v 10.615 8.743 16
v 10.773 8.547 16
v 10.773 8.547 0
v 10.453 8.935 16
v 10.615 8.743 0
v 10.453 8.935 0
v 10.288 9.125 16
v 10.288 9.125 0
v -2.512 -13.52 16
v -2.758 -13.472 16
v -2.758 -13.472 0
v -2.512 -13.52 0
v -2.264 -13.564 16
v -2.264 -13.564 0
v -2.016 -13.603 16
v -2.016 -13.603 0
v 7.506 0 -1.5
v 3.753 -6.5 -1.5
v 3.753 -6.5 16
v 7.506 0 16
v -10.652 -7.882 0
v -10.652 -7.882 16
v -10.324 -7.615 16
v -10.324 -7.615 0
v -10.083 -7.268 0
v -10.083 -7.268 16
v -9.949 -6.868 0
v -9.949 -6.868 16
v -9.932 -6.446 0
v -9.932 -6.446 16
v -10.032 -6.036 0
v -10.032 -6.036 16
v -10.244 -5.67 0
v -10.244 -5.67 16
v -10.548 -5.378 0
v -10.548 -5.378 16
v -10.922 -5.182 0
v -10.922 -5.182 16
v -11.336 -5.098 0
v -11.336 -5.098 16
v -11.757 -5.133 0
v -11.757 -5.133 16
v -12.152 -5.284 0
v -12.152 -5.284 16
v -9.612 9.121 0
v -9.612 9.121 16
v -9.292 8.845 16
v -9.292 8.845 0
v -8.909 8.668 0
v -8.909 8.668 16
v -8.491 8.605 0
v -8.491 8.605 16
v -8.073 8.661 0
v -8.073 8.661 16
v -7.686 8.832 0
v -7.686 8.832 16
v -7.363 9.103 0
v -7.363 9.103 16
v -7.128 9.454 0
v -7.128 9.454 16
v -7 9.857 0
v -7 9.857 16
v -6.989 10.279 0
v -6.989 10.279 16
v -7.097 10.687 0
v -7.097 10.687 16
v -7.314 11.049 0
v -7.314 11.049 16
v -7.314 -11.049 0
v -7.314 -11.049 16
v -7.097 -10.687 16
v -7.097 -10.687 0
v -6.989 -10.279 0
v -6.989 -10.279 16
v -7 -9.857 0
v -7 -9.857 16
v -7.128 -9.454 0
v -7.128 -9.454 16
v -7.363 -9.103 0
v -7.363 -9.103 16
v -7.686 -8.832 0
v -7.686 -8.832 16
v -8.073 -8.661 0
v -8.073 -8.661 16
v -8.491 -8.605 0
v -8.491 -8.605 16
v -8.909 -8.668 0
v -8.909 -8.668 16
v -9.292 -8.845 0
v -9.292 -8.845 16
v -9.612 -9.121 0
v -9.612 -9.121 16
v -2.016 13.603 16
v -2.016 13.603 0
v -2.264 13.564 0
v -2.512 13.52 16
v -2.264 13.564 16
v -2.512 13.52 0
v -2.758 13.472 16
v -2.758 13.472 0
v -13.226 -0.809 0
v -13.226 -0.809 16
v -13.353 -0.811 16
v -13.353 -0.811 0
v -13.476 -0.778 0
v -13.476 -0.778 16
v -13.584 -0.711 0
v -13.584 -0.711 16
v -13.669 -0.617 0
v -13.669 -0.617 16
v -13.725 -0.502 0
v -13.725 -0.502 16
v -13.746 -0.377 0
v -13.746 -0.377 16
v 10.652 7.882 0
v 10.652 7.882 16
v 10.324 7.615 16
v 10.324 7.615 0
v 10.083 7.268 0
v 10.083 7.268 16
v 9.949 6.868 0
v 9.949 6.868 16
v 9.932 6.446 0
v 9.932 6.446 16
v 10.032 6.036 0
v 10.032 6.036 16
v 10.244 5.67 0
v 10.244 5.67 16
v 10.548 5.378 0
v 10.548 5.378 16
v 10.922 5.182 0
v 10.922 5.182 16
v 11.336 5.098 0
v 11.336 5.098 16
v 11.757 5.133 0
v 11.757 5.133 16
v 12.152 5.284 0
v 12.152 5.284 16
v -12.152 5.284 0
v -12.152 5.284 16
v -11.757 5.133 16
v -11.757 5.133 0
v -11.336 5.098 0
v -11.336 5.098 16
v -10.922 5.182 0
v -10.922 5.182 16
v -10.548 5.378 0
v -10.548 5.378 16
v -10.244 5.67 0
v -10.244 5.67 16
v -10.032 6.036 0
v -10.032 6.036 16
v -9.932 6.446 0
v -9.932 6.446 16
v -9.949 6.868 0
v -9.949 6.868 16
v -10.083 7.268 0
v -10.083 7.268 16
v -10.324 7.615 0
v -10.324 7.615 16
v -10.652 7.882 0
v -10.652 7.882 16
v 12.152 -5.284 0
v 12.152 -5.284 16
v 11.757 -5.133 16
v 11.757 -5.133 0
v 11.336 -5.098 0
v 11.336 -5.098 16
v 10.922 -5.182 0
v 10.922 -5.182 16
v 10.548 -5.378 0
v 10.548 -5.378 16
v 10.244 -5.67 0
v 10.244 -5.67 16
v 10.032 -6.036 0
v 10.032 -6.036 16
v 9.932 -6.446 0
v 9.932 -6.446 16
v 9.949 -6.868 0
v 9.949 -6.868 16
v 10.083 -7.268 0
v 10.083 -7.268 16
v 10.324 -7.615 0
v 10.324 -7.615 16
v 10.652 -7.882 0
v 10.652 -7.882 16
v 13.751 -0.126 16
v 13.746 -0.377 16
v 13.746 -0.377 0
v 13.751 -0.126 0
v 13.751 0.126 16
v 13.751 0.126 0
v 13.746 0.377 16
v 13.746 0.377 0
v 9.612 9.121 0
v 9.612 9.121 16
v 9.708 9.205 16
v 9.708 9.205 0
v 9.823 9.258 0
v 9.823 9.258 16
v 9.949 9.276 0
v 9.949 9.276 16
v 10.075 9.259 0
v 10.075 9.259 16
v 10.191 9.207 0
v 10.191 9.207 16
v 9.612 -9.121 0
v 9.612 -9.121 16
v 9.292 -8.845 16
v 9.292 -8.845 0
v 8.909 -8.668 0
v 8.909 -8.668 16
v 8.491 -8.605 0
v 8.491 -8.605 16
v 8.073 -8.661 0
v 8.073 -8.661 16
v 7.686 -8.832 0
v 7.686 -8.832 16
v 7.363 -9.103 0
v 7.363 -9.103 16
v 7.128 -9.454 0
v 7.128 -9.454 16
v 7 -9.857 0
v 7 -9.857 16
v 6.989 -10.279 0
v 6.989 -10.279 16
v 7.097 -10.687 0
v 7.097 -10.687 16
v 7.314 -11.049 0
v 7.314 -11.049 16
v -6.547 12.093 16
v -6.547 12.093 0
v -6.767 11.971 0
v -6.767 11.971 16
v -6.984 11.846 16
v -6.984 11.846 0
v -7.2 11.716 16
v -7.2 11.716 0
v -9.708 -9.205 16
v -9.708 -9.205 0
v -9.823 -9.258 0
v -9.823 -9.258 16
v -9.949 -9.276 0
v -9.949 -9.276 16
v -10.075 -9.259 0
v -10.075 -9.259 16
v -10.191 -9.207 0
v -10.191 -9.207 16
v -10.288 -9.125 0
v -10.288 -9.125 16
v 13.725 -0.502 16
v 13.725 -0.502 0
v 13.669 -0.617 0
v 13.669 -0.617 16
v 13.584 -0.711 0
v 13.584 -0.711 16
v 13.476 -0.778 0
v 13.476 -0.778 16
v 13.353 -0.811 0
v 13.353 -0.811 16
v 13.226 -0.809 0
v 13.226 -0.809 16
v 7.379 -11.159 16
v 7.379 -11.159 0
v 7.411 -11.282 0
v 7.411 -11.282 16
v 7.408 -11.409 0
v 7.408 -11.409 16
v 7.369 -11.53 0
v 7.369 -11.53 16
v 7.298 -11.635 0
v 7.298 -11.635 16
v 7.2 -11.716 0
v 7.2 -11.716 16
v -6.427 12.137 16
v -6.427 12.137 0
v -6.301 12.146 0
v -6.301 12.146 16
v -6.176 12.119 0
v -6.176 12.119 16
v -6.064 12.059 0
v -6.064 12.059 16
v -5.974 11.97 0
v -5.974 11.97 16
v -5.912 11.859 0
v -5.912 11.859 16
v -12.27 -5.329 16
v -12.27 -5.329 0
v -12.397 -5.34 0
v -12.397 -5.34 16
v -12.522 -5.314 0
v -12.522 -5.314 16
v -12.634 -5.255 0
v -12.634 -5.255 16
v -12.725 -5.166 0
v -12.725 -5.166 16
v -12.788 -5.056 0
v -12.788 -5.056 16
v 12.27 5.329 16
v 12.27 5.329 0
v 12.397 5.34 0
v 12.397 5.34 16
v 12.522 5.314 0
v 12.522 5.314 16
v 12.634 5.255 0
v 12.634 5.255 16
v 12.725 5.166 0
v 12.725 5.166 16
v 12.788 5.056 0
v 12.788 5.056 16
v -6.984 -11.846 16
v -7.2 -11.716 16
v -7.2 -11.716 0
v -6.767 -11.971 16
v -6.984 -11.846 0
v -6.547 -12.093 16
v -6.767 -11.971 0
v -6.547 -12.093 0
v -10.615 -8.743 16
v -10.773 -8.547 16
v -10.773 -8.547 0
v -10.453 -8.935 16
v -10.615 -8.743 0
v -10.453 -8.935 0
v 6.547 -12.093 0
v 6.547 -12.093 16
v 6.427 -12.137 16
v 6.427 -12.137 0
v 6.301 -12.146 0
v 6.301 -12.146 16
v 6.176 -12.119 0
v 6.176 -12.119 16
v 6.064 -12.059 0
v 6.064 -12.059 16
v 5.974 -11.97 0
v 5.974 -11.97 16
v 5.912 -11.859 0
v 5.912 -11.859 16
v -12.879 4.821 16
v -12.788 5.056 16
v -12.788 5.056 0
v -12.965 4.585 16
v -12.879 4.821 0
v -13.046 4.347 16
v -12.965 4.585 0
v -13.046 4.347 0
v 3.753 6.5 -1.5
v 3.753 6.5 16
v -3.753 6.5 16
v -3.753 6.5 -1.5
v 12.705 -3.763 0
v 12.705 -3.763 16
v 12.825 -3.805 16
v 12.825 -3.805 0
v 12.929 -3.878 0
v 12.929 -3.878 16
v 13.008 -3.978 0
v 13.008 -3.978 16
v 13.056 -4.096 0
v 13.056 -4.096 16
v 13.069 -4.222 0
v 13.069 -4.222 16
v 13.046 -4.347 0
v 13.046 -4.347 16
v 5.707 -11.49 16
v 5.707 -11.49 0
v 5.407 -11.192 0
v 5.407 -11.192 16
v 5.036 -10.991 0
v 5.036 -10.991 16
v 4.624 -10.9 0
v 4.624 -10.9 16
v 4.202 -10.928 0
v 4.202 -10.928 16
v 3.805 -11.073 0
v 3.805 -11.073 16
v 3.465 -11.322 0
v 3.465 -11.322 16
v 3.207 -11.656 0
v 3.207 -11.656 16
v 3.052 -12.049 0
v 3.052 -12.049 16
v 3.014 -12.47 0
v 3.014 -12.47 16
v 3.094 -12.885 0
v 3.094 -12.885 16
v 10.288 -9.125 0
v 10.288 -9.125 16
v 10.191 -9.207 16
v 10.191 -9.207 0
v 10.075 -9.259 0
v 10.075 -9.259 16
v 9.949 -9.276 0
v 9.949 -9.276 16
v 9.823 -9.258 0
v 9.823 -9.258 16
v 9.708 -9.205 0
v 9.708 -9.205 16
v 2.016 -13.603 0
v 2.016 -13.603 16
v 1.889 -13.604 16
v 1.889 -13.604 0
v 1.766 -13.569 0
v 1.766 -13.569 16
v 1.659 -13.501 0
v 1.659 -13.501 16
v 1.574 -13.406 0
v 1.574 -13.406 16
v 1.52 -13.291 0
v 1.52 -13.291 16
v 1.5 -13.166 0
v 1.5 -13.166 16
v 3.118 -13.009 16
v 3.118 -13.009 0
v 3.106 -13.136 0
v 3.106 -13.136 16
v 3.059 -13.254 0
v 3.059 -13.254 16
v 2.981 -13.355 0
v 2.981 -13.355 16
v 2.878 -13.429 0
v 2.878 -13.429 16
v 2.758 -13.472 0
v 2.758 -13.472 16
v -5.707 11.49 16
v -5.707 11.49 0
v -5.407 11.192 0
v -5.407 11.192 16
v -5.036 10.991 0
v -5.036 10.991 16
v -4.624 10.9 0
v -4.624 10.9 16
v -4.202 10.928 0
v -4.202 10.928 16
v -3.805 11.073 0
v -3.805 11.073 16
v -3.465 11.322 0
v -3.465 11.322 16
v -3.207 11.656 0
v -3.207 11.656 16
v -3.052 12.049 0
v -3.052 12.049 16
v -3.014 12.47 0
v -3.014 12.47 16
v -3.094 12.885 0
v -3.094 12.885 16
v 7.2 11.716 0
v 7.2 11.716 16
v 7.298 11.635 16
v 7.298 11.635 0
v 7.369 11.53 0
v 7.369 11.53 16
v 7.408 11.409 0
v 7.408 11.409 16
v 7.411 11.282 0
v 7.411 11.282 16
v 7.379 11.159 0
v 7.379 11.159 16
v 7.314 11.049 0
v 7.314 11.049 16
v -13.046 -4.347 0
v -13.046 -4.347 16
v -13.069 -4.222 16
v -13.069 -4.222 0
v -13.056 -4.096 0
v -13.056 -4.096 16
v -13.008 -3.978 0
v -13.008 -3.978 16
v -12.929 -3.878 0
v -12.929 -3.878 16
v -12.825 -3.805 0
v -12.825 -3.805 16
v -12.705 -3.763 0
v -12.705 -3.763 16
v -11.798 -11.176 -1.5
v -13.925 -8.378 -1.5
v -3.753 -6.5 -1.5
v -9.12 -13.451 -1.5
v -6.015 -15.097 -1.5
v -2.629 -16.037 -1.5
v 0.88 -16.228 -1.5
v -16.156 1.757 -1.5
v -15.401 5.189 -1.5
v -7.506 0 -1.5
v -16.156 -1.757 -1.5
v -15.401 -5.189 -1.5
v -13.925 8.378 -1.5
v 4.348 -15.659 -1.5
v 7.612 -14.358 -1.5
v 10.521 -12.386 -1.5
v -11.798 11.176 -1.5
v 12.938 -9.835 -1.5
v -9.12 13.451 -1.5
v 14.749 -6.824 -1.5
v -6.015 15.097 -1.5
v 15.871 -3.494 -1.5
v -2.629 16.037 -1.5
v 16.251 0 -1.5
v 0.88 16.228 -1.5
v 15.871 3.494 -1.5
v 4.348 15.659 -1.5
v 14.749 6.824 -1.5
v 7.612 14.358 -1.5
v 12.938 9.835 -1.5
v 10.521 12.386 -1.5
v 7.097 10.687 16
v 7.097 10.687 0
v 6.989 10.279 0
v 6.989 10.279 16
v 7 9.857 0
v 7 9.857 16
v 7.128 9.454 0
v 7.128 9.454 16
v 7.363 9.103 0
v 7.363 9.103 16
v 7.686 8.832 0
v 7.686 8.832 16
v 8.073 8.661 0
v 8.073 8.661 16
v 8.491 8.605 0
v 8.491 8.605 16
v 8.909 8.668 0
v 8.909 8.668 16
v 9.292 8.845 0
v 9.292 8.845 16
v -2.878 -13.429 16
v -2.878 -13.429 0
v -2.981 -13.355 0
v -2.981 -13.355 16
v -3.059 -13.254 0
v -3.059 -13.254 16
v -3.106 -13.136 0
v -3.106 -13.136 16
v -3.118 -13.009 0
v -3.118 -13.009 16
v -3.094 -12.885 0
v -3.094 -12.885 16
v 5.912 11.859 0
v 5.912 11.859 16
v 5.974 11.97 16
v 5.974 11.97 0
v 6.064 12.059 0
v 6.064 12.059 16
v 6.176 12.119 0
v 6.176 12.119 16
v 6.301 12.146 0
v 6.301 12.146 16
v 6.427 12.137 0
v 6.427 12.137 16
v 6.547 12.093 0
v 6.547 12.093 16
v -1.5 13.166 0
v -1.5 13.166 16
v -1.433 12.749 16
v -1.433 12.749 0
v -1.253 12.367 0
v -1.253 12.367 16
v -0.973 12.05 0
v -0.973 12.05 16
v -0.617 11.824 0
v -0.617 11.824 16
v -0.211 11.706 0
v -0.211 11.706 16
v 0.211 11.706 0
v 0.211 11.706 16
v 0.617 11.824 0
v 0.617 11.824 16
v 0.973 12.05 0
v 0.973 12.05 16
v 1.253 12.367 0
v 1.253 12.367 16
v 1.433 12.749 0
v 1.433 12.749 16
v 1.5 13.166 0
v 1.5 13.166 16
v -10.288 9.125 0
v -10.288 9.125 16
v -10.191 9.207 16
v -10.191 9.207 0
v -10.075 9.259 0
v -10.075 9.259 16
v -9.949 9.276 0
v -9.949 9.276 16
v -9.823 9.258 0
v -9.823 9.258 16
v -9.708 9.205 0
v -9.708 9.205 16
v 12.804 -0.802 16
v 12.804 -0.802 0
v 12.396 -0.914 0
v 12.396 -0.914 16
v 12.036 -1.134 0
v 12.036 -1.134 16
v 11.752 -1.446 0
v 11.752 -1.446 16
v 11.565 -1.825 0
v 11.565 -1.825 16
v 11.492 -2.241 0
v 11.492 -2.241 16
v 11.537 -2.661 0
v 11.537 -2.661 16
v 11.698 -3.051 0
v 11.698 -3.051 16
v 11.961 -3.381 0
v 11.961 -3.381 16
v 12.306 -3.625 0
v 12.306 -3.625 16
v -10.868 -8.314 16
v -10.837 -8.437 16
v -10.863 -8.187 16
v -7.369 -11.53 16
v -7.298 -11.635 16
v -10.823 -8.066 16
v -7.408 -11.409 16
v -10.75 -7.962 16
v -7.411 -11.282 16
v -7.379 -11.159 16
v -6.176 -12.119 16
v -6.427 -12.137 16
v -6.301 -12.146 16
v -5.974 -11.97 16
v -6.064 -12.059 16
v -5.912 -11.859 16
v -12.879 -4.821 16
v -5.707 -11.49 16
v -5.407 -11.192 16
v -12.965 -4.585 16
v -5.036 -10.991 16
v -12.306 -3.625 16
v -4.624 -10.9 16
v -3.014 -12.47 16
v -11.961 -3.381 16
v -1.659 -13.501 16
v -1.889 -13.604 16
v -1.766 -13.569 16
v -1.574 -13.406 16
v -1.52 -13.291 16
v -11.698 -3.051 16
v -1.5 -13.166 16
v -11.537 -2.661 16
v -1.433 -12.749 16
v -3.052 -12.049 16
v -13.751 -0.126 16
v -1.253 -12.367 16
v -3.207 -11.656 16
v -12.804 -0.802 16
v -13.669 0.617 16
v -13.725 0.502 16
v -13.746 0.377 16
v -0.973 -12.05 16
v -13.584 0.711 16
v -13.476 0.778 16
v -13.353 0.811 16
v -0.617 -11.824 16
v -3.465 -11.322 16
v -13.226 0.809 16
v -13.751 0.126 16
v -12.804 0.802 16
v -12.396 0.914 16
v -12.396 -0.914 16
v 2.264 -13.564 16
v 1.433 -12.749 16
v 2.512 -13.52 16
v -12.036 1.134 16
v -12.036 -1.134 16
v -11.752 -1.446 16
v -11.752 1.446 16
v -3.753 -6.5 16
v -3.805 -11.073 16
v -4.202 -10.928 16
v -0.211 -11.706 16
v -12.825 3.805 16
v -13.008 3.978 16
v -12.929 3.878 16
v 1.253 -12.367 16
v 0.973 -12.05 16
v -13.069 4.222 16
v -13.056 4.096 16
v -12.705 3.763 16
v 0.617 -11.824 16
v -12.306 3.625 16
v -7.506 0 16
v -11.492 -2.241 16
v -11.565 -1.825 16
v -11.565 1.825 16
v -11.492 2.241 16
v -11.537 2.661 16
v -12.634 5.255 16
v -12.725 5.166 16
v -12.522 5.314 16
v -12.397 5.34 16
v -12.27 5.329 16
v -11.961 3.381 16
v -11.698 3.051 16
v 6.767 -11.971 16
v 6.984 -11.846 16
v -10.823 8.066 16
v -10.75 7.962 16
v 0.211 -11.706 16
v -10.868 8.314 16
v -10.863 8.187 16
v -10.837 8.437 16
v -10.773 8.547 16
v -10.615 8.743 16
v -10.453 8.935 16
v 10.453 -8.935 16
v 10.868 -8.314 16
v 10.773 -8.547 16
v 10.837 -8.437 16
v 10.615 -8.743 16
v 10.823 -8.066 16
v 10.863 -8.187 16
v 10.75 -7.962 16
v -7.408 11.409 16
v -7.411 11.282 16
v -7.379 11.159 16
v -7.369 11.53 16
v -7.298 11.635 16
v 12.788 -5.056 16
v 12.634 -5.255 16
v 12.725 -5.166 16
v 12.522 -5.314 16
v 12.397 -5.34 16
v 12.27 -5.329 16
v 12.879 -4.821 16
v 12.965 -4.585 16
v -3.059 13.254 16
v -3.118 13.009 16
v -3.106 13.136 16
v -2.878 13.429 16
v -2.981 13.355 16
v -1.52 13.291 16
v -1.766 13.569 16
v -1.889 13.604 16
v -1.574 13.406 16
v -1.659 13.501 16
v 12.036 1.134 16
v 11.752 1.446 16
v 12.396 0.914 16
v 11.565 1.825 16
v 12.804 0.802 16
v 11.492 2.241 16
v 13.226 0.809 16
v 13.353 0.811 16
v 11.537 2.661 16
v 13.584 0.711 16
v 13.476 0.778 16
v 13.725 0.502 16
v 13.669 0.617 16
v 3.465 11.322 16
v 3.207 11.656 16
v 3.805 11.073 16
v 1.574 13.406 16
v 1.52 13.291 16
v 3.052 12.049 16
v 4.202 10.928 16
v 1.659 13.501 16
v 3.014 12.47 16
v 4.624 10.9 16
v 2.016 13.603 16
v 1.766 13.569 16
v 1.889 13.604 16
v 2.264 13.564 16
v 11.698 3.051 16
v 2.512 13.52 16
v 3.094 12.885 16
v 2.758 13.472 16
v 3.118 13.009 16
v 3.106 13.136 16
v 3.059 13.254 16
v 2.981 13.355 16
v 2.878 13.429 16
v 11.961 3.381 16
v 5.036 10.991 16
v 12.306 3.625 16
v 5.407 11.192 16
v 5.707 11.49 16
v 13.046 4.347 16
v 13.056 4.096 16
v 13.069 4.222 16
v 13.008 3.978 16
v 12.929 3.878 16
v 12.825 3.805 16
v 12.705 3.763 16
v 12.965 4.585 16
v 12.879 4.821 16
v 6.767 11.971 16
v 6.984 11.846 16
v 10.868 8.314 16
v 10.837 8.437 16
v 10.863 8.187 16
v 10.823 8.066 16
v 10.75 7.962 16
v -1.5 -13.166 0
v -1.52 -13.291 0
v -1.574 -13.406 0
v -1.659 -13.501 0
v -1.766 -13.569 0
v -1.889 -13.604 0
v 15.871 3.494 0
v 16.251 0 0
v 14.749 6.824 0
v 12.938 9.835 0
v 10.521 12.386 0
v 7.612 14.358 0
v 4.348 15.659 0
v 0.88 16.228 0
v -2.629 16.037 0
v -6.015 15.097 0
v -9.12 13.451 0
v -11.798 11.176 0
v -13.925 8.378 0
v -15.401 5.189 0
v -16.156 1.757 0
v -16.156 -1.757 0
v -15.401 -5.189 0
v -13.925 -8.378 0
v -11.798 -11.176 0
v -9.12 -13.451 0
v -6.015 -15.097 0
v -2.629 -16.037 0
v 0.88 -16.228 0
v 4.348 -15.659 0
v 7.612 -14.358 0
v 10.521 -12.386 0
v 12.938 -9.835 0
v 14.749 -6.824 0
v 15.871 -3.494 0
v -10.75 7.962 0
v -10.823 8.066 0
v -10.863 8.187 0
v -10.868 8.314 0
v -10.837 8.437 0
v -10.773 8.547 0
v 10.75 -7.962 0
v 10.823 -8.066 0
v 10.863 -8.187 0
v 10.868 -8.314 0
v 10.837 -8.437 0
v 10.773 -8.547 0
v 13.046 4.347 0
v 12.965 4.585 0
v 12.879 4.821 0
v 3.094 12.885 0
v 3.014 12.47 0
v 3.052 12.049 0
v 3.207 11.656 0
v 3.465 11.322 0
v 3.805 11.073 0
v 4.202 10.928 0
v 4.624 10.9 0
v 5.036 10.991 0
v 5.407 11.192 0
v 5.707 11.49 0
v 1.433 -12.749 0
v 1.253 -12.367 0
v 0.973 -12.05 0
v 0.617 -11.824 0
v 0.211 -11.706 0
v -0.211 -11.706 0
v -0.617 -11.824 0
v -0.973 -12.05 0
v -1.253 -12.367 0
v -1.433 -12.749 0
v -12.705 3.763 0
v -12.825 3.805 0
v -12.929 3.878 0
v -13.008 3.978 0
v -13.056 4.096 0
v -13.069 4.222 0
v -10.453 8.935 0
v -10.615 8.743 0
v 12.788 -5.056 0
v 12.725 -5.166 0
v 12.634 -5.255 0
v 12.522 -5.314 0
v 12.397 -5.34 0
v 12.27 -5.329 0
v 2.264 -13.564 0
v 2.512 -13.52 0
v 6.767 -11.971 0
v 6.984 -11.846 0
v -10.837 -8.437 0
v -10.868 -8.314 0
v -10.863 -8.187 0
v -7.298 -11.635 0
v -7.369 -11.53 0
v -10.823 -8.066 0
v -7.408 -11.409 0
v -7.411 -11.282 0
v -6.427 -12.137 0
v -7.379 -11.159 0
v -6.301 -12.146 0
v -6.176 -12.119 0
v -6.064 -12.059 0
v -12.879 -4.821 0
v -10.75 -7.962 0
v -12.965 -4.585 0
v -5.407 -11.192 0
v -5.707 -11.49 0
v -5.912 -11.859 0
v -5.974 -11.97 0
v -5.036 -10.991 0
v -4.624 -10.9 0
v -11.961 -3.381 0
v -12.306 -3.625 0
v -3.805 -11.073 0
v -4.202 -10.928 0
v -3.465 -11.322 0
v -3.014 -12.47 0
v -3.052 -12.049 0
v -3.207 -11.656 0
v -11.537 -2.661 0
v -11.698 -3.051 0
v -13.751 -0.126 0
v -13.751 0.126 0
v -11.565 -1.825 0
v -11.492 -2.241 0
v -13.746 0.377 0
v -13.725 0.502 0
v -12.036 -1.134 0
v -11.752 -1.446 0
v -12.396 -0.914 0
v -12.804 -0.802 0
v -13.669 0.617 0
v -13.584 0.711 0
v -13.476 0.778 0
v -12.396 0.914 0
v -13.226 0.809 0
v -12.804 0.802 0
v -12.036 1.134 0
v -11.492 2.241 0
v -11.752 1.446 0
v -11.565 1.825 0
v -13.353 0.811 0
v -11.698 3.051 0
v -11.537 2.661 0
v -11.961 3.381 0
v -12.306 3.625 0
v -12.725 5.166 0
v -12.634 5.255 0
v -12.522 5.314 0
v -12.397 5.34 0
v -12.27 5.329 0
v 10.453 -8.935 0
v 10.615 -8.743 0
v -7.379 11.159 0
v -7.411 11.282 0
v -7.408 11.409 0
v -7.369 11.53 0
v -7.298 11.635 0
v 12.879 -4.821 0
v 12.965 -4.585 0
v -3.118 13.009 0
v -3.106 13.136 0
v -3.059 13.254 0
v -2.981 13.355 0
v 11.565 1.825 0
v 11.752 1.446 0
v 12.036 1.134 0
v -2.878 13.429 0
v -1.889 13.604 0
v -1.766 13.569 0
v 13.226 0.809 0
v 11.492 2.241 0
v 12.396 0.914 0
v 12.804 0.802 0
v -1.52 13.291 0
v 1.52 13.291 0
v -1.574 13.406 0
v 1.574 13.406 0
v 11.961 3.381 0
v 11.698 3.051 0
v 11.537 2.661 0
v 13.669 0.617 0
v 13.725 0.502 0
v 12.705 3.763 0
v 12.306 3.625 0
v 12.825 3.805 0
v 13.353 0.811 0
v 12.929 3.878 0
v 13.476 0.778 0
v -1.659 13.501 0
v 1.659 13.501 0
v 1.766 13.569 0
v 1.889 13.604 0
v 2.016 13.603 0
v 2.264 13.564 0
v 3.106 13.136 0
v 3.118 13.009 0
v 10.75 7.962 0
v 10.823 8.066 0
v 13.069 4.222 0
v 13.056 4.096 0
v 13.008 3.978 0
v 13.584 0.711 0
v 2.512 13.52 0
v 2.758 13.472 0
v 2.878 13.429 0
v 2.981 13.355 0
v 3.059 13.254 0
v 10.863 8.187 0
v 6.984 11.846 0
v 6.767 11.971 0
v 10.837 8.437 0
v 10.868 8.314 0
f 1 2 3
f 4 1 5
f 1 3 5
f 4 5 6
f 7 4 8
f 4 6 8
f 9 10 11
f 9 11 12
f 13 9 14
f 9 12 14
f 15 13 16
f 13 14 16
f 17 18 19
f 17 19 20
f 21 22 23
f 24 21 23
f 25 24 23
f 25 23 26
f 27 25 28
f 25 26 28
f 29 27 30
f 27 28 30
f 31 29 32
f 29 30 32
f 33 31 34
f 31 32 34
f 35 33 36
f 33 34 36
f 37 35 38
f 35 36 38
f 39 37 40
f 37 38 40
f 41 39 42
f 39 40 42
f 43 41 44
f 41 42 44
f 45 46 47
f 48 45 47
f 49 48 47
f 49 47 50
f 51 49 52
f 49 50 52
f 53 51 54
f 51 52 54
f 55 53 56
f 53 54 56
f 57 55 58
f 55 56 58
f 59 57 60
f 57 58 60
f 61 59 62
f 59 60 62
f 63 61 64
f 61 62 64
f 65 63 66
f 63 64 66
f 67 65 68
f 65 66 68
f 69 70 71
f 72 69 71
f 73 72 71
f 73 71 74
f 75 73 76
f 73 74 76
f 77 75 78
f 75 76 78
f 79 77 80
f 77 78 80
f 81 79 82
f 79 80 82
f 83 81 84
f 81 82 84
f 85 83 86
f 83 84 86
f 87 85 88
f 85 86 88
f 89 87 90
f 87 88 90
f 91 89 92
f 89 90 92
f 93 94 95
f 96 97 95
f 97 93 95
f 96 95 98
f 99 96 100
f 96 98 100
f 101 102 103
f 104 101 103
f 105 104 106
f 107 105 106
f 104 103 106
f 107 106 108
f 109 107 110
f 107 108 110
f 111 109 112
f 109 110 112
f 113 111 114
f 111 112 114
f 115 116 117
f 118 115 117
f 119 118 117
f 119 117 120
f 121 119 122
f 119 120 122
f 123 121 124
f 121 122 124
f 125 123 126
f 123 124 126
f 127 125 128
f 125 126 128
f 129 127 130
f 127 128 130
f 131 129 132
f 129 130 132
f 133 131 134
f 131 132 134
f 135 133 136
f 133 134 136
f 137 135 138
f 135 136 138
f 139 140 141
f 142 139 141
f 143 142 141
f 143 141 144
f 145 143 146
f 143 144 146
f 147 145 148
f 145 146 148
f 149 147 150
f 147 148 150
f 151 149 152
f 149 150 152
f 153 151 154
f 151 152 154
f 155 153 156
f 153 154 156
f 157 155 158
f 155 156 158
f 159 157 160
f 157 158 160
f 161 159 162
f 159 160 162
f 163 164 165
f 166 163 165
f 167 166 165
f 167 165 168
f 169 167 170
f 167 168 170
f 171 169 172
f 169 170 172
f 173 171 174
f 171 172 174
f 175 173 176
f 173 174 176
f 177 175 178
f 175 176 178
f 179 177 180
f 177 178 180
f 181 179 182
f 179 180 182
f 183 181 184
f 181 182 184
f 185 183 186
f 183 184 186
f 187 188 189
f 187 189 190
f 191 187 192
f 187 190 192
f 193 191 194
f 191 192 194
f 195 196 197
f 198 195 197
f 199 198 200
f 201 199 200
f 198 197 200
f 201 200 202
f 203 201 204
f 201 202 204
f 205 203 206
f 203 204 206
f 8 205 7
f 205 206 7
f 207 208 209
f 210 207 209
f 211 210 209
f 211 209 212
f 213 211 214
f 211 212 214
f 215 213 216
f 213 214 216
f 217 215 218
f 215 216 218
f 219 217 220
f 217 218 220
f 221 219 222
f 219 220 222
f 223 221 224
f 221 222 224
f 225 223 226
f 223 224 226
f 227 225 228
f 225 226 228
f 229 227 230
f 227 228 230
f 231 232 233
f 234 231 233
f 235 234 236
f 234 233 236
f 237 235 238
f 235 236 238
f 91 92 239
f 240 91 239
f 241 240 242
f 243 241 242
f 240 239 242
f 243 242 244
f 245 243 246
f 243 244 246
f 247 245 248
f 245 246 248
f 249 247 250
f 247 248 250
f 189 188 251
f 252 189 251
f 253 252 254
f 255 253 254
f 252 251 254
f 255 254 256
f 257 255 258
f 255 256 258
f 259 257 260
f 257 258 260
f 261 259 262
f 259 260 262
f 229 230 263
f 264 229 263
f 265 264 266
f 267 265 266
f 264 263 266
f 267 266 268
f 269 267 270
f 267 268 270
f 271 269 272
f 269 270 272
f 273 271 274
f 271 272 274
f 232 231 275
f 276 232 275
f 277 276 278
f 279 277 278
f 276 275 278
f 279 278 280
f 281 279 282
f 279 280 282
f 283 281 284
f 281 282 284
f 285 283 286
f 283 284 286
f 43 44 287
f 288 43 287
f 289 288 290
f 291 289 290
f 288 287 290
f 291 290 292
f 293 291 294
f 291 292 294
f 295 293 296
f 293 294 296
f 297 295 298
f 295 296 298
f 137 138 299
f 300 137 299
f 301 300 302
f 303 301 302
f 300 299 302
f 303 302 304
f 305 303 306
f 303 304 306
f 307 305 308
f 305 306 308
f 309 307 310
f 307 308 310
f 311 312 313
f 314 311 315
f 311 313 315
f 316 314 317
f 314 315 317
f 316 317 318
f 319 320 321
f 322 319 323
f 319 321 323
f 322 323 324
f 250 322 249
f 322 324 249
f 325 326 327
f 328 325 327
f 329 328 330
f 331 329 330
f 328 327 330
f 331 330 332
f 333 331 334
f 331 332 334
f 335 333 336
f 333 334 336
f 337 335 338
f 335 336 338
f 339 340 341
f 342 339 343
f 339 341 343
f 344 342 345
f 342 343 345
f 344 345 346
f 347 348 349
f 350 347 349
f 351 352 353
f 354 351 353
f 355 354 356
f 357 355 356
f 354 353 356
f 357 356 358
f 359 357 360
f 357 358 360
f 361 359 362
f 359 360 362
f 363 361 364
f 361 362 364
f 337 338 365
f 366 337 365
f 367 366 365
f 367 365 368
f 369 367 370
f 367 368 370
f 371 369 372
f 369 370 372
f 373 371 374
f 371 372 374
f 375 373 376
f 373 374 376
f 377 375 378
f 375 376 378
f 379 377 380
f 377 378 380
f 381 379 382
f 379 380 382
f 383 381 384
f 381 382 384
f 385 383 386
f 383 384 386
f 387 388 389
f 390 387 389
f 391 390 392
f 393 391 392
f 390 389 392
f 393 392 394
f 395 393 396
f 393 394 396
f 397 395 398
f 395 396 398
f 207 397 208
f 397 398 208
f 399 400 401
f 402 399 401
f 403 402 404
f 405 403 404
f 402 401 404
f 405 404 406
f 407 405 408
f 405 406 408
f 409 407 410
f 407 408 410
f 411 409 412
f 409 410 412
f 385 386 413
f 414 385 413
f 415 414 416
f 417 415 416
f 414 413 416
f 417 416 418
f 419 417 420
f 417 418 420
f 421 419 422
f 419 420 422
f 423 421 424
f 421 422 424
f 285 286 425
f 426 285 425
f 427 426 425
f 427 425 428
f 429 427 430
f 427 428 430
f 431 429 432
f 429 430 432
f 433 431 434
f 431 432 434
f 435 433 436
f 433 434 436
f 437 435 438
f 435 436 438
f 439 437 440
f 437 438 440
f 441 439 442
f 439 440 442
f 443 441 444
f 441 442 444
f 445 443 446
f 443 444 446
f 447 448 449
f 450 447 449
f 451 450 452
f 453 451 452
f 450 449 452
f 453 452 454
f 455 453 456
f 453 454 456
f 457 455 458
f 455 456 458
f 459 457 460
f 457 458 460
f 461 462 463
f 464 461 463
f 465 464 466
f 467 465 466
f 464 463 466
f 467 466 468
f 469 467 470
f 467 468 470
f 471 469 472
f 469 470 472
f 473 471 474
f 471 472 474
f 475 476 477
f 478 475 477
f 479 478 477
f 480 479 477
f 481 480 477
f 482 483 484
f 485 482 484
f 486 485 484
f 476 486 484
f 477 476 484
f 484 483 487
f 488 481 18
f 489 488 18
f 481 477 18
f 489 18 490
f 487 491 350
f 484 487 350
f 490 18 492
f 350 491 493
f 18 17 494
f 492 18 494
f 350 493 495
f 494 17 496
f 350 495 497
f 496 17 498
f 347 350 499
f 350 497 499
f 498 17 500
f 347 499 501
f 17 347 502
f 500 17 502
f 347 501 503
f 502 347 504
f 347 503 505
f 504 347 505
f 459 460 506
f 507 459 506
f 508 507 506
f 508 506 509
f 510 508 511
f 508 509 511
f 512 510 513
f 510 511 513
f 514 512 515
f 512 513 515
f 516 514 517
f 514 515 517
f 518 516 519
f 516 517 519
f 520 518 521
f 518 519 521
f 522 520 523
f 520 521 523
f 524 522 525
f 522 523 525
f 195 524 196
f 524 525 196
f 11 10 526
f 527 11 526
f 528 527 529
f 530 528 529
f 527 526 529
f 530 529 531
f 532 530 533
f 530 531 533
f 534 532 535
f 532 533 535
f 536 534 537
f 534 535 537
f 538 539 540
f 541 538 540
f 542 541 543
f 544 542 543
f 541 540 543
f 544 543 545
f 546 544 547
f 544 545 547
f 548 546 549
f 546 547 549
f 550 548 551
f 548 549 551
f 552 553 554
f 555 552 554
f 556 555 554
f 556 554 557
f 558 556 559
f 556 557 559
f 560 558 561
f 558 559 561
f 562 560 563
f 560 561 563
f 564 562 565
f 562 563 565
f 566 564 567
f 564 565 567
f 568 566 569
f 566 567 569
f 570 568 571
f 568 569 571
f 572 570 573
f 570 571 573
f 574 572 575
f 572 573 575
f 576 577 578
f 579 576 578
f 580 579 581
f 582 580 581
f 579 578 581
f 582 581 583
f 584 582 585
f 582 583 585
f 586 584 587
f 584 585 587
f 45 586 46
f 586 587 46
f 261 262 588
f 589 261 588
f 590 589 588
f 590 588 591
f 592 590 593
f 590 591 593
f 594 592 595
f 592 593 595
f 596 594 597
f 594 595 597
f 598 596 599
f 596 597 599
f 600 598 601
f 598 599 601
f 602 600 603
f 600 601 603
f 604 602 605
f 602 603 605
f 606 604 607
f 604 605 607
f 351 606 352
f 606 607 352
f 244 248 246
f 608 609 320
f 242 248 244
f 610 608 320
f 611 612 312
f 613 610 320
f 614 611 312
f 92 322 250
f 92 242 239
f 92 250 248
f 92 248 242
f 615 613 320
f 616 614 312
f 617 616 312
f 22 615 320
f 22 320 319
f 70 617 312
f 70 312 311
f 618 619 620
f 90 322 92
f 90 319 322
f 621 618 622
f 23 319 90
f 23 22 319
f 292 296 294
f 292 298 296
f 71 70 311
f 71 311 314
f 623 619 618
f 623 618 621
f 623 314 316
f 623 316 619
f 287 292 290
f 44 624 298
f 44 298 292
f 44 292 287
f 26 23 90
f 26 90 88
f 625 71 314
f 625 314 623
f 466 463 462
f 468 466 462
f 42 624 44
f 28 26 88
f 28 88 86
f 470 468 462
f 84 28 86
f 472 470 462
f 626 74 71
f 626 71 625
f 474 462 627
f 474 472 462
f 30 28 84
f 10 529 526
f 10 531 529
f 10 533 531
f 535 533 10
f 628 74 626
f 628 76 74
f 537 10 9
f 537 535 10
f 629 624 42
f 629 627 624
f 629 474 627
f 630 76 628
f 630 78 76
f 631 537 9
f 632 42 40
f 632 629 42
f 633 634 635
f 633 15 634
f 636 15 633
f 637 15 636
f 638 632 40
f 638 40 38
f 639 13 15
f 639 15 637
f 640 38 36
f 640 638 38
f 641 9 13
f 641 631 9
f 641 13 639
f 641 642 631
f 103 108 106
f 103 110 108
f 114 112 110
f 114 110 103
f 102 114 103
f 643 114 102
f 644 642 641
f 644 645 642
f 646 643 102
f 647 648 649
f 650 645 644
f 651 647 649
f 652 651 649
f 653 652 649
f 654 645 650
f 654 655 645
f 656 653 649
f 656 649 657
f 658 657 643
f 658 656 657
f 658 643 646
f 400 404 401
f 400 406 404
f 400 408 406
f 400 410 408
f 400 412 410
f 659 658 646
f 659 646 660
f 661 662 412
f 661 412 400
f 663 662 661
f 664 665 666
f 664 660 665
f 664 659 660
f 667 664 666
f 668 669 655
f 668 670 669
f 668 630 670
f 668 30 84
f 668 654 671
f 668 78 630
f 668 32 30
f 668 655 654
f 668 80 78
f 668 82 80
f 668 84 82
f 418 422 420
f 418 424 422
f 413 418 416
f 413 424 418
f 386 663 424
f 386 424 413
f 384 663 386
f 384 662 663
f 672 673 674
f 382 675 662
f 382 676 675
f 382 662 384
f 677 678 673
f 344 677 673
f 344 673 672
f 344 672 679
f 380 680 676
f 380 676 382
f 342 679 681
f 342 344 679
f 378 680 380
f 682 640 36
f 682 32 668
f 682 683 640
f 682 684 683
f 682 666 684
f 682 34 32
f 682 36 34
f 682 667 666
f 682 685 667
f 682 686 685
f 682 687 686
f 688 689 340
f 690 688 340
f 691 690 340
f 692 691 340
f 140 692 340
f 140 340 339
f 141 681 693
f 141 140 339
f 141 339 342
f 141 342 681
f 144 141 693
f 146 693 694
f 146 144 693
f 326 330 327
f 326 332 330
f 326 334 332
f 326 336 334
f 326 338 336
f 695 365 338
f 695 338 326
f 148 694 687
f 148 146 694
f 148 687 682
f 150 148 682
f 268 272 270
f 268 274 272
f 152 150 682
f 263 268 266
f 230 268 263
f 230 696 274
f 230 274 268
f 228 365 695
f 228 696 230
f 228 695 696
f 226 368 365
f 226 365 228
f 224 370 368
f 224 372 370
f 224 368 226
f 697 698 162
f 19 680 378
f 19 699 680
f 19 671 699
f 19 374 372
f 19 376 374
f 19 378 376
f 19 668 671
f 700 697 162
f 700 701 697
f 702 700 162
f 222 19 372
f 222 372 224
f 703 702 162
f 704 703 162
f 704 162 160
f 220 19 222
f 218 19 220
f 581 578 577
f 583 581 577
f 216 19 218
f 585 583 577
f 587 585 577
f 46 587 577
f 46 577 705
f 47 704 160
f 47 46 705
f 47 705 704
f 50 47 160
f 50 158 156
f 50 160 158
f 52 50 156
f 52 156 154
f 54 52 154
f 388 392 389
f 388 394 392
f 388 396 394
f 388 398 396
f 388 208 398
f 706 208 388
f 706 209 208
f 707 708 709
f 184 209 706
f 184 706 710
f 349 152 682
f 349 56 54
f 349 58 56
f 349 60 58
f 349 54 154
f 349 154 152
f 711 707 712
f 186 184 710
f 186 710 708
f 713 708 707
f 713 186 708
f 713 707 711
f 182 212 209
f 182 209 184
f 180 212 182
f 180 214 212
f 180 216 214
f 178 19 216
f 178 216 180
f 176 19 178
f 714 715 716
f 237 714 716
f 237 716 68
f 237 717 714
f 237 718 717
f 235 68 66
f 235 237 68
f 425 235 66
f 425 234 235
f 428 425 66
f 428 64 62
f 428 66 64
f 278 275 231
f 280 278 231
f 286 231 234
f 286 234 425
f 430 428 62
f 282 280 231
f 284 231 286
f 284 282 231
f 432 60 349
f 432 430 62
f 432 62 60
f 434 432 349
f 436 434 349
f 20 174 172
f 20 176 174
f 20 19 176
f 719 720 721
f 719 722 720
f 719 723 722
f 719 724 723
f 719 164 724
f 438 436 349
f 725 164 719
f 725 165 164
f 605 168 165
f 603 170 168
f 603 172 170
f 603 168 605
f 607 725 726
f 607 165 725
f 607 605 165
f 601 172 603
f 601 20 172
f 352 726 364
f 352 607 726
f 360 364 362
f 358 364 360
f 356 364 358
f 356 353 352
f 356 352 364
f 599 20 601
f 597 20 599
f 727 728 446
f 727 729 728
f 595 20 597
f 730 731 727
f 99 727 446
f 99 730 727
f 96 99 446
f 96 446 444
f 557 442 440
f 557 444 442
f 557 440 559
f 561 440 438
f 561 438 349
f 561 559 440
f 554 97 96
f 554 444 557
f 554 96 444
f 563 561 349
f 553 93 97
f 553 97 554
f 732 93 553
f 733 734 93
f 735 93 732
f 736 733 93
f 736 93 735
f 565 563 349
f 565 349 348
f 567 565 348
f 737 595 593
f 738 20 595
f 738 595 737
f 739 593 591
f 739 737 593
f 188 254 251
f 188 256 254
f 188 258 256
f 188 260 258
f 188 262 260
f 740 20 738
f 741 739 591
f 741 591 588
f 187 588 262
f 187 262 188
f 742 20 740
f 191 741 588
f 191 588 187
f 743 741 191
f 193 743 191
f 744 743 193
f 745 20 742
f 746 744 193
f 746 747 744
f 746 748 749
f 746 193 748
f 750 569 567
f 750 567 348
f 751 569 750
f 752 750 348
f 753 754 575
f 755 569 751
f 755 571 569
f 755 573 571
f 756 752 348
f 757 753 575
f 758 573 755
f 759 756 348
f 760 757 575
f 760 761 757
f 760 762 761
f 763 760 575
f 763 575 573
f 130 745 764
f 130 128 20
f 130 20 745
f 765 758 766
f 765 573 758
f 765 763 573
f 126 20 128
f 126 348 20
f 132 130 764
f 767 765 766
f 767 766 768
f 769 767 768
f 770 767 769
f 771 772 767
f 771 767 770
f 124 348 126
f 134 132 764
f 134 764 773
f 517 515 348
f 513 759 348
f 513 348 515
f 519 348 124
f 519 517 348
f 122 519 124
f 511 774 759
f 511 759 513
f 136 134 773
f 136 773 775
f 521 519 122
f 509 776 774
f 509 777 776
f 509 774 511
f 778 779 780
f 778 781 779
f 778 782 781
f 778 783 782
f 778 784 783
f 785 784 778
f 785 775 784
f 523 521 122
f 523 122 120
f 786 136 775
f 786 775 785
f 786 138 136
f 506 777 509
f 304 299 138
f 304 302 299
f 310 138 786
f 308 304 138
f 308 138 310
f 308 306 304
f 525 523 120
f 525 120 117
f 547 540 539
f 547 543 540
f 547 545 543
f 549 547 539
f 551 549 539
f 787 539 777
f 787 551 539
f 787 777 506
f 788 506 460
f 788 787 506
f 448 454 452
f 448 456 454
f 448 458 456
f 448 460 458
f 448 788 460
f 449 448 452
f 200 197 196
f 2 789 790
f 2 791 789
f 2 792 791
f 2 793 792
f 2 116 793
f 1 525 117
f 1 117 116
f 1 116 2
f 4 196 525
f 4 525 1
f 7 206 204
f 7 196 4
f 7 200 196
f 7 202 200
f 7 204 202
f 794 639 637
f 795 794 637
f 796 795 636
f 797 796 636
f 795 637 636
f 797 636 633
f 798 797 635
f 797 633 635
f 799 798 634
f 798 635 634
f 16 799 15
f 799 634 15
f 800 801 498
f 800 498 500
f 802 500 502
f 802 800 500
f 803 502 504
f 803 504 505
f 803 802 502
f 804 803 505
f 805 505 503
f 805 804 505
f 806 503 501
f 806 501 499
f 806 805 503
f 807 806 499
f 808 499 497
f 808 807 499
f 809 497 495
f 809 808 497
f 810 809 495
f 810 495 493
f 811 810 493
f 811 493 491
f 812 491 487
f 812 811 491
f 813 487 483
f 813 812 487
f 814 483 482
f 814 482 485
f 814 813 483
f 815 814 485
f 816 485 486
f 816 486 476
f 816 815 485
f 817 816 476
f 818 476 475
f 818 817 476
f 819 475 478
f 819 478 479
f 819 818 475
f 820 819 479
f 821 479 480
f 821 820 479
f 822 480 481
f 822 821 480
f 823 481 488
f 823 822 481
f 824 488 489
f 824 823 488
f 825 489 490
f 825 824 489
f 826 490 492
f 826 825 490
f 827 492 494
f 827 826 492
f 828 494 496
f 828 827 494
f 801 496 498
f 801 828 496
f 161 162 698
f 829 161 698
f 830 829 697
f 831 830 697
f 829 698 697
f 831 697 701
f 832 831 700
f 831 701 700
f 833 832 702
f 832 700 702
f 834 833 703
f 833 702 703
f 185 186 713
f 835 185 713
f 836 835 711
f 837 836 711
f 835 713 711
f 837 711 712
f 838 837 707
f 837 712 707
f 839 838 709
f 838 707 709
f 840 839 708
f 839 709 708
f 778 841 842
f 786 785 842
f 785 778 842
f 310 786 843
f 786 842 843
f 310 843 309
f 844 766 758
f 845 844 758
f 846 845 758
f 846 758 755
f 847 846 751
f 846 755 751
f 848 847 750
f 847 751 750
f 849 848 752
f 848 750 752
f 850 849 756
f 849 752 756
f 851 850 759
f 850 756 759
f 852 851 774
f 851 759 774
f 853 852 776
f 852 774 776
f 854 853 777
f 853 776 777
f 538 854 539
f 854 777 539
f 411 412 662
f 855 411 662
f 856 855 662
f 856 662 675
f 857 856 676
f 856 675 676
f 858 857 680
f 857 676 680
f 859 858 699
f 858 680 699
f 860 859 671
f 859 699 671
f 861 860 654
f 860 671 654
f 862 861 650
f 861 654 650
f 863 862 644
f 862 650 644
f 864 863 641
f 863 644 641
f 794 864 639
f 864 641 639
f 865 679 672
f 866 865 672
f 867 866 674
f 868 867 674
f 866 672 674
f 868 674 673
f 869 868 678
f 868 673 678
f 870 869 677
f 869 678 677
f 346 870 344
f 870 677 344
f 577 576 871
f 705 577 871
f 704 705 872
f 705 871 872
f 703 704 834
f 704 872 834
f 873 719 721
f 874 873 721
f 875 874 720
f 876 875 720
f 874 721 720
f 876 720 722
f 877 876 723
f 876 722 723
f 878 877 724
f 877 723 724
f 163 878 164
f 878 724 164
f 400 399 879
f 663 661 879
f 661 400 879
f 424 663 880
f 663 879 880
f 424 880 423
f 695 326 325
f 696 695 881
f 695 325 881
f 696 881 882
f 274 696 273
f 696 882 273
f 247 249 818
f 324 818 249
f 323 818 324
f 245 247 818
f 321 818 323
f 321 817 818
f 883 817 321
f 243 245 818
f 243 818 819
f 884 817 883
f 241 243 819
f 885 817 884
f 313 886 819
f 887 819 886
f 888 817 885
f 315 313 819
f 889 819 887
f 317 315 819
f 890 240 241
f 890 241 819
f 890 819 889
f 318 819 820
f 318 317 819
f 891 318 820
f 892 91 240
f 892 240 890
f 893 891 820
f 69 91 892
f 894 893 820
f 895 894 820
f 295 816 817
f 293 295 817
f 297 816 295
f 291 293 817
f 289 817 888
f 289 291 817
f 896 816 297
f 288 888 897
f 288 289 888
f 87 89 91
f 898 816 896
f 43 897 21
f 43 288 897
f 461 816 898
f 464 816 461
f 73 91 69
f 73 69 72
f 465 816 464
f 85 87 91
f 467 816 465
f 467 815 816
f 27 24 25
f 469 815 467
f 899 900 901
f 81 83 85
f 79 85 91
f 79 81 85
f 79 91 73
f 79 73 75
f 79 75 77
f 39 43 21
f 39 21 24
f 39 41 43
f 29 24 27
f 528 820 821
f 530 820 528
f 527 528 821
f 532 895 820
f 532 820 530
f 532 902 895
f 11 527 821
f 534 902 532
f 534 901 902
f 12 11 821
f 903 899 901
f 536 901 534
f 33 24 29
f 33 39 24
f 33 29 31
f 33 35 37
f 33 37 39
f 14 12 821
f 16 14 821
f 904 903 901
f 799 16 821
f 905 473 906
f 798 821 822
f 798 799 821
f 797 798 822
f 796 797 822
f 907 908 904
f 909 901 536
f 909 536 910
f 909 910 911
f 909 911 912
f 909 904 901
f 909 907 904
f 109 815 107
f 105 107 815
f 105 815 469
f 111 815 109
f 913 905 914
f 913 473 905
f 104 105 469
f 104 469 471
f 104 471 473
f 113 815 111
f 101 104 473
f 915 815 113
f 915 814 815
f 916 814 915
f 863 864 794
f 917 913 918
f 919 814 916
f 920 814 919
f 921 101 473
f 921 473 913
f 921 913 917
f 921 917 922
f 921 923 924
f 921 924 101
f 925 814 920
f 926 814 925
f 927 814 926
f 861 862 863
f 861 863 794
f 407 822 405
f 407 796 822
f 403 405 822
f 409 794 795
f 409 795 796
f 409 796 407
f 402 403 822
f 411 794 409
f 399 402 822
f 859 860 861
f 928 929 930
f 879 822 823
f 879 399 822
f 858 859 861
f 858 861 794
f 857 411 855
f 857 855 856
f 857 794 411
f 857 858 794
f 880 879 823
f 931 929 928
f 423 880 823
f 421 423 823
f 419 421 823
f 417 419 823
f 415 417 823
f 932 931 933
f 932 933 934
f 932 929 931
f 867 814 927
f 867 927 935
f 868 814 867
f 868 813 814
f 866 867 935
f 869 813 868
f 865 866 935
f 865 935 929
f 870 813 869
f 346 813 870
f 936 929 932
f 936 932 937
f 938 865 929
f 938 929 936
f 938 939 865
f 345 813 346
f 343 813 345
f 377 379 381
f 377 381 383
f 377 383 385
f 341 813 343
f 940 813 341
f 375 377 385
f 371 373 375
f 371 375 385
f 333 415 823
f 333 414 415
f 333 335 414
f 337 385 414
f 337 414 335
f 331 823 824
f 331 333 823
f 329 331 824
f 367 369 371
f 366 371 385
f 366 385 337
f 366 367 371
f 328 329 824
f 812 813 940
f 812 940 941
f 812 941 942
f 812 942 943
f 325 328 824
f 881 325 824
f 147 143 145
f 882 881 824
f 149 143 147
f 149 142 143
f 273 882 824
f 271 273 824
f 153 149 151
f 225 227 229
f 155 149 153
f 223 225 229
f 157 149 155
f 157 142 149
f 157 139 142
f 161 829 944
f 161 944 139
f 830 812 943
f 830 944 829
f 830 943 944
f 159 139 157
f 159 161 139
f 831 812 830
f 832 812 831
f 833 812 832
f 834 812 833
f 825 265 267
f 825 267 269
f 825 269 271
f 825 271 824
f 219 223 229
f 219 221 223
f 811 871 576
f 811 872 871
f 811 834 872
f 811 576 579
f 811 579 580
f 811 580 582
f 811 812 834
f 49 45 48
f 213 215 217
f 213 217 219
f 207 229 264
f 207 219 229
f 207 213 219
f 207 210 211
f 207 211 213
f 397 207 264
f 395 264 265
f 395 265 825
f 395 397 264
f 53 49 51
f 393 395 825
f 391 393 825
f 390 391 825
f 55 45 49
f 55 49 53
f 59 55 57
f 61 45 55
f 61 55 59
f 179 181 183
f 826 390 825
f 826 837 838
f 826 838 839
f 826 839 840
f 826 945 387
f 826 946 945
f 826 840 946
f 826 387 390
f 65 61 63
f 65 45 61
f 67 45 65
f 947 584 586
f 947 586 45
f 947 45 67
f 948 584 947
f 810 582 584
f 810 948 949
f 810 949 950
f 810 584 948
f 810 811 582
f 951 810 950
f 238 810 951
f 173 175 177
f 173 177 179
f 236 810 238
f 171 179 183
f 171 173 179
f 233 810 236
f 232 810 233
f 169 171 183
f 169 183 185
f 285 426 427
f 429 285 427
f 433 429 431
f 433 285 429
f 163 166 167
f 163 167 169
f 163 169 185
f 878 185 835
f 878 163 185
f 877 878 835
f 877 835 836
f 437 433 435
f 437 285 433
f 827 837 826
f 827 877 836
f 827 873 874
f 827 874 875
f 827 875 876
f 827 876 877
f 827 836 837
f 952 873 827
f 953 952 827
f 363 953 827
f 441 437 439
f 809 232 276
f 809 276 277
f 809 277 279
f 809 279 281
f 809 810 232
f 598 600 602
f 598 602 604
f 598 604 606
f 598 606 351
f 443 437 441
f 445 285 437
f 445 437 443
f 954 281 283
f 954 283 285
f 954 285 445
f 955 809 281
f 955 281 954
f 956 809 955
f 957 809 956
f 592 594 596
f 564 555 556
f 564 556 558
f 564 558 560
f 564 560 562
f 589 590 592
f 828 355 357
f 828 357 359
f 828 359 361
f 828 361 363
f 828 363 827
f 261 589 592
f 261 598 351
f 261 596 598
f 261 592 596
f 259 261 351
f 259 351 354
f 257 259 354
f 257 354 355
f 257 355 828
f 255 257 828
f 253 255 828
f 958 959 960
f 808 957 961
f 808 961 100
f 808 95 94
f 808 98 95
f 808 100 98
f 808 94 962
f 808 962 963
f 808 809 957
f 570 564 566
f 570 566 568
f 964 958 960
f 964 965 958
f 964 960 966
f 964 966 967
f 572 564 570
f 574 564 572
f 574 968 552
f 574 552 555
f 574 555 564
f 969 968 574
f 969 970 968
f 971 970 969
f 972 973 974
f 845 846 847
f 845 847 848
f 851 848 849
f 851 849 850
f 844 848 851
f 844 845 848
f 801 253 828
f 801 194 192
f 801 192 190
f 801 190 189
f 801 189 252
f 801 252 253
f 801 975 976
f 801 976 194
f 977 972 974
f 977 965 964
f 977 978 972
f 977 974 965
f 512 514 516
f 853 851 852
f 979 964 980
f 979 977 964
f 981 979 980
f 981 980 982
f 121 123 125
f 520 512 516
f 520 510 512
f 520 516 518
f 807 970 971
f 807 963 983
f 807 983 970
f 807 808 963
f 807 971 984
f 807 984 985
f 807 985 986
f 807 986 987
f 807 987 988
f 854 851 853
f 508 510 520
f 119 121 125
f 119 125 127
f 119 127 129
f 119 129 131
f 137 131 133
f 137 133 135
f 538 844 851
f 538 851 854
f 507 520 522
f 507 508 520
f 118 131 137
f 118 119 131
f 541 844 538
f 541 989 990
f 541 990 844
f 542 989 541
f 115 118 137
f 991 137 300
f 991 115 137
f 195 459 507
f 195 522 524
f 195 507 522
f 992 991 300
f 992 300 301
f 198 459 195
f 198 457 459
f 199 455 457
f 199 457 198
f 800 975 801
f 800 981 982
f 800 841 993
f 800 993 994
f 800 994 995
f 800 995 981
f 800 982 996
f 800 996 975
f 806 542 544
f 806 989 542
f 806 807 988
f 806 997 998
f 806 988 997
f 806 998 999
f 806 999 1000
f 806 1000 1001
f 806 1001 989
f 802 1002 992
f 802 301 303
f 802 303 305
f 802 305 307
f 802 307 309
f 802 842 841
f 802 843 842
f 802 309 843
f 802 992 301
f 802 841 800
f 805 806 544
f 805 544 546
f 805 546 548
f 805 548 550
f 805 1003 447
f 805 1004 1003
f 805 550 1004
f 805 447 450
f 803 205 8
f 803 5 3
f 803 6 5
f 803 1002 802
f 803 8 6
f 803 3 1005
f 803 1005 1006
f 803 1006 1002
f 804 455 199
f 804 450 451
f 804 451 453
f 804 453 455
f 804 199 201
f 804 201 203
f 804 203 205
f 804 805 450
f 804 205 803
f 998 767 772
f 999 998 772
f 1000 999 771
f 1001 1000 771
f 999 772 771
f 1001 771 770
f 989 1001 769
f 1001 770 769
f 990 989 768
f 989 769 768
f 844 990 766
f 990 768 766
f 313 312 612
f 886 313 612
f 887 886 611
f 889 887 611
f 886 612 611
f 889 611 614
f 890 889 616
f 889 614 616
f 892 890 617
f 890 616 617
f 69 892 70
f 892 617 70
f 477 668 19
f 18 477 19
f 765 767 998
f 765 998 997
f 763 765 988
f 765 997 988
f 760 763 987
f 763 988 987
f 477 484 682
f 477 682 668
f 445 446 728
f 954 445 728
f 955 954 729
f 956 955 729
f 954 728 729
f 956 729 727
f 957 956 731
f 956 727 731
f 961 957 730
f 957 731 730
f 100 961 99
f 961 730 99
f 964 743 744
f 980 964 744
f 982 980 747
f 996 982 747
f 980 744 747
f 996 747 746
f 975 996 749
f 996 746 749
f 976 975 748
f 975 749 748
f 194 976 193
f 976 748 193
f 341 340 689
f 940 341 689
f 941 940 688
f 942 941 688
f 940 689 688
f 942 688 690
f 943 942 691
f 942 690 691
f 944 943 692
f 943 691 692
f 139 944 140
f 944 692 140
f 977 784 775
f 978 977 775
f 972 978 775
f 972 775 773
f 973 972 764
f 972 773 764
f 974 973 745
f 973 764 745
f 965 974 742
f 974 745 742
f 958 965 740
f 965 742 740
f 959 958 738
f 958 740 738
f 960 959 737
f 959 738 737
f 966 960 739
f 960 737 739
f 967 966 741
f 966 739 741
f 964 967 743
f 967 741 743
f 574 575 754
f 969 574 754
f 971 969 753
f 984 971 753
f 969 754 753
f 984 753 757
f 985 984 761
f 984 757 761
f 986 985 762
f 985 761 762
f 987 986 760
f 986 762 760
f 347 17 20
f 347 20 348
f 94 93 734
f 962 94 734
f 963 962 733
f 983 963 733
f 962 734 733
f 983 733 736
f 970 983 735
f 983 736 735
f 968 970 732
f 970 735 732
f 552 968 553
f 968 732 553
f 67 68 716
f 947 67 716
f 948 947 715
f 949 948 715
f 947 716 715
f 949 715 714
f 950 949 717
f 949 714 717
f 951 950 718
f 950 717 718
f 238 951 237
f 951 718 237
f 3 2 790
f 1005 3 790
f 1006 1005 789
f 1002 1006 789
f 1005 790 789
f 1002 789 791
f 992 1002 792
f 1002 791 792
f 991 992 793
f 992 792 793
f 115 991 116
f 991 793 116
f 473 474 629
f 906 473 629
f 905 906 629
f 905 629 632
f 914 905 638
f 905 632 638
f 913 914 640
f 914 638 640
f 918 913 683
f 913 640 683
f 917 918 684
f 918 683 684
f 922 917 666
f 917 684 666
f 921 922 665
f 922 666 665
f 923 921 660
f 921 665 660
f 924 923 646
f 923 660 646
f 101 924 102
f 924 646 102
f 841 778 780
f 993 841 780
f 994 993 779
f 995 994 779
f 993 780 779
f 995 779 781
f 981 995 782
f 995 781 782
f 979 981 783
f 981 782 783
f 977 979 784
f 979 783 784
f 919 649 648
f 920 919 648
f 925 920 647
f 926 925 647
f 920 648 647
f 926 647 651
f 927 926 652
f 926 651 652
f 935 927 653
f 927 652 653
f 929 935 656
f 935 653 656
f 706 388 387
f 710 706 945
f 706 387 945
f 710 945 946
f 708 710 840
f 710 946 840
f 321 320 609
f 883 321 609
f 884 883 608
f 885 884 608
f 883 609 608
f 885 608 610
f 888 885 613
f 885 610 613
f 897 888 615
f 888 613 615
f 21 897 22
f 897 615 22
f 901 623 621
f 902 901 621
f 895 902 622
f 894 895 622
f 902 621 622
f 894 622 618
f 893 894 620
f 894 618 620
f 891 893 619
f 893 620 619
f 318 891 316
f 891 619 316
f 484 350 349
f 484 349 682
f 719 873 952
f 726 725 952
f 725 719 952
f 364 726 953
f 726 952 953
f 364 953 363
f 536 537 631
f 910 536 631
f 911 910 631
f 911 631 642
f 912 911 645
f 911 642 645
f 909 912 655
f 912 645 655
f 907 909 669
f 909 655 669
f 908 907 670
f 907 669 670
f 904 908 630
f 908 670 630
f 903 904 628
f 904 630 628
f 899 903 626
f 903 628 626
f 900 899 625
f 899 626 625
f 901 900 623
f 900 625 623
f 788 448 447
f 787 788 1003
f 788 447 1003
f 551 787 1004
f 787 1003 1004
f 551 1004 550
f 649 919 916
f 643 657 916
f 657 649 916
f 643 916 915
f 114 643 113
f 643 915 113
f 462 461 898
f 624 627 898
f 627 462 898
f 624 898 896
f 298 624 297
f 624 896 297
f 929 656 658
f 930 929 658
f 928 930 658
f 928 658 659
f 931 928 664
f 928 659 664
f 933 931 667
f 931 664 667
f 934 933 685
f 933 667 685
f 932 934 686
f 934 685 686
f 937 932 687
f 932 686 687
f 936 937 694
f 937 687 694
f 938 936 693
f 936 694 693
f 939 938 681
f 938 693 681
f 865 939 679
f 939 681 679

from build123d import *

# Parameters (mm, degrees)
F2_R            = 13.7514448946
F3_DEPTH        = 16
F5_DEPTH        = 16
F5_COPIES_COUNT = 18
F8_R            = 16.2514448946
F8_R_2          = 13.7514448946
F9_DEPTH        = 1.5
F10_DEPTH       = 17.501


# Not quite as in the source:
# - a feature of the source that left no trace in its solid (it failed there, or was rolled back) is left out
# - a pattern or mirror of a feature is missing from the dataset's text; its kind, count and spacing are read off the source's solid


with BuildPart() as f3:
    # F2 (on Top) → F3 (new body)
    with BuildSketch(Plane.XY):
        Circle(F2_R)
    extrude(amount=F3_DEPTH)

    # F4 (on face) → F5 (cut, through all)
    with BuildSketch(Plane.XY.offset(16)):
        with BuildLine():
            ThreePointArc((-2.015669756, 13.6029155744), (-1.6587079327, 13.5010225766), (-1.499776395, 13.1655457628))
            ThreePointArc((-1.499776395, 13.1655457628), (0, 11.6914448946), (1.499776395, 13.1655457628))
            ThreePointArc((1.499776395, 13.1655457628), (1.6587079327, 13.5010225766), (2.015669756, 13.6029155744))
            ThreePointArc((2.015669756, 13.6029155744), (0, 13.7514448946), (-2.015669756, 13.6029155744))
        make_face()
    f5 = extrude(amount=-F5_DEPTH, mode=Mode.SUBTRACT)

    # F5_copies: F5 ×18 about axis
    f5_copies_axis = Axis((0, 0, 0), (0, 0, 1))
    for i in range(1, F5_COPIES_COUNT):
        add(f5.rotate(f5_copies_axis, i * 360 / F5_COPIES_COUNT), mode=Mode.SUBTRACT)

    # F8 (on face) + F2 (on Top) → F9 (join)
    with BuildSketch(Plane.XY):
        Circle(F8_R)
        Circle(F8_R_2, mode=Mode.SUBTRACT)
    with BuildSketch(Plane.XY):
        Circle(F2_R)
    extrude(amount=-F9_DEPTH)

    # F7 (on face) → F10 (cut, through all)
    with BuildSketch(Plane.XY.offset(16)):
        Polygon((3.7527767497, 6.5), (-3.7527767497, 6.5), (-7.5055534995, 0), (-3.7527767497, -6.5), (3.7527767497, -6.5), (7.5055534995, 0), align=None)
    extrude(amount=-F10_DEPTH, mode=Mode.SUBTRACT)


solid = f3.part
